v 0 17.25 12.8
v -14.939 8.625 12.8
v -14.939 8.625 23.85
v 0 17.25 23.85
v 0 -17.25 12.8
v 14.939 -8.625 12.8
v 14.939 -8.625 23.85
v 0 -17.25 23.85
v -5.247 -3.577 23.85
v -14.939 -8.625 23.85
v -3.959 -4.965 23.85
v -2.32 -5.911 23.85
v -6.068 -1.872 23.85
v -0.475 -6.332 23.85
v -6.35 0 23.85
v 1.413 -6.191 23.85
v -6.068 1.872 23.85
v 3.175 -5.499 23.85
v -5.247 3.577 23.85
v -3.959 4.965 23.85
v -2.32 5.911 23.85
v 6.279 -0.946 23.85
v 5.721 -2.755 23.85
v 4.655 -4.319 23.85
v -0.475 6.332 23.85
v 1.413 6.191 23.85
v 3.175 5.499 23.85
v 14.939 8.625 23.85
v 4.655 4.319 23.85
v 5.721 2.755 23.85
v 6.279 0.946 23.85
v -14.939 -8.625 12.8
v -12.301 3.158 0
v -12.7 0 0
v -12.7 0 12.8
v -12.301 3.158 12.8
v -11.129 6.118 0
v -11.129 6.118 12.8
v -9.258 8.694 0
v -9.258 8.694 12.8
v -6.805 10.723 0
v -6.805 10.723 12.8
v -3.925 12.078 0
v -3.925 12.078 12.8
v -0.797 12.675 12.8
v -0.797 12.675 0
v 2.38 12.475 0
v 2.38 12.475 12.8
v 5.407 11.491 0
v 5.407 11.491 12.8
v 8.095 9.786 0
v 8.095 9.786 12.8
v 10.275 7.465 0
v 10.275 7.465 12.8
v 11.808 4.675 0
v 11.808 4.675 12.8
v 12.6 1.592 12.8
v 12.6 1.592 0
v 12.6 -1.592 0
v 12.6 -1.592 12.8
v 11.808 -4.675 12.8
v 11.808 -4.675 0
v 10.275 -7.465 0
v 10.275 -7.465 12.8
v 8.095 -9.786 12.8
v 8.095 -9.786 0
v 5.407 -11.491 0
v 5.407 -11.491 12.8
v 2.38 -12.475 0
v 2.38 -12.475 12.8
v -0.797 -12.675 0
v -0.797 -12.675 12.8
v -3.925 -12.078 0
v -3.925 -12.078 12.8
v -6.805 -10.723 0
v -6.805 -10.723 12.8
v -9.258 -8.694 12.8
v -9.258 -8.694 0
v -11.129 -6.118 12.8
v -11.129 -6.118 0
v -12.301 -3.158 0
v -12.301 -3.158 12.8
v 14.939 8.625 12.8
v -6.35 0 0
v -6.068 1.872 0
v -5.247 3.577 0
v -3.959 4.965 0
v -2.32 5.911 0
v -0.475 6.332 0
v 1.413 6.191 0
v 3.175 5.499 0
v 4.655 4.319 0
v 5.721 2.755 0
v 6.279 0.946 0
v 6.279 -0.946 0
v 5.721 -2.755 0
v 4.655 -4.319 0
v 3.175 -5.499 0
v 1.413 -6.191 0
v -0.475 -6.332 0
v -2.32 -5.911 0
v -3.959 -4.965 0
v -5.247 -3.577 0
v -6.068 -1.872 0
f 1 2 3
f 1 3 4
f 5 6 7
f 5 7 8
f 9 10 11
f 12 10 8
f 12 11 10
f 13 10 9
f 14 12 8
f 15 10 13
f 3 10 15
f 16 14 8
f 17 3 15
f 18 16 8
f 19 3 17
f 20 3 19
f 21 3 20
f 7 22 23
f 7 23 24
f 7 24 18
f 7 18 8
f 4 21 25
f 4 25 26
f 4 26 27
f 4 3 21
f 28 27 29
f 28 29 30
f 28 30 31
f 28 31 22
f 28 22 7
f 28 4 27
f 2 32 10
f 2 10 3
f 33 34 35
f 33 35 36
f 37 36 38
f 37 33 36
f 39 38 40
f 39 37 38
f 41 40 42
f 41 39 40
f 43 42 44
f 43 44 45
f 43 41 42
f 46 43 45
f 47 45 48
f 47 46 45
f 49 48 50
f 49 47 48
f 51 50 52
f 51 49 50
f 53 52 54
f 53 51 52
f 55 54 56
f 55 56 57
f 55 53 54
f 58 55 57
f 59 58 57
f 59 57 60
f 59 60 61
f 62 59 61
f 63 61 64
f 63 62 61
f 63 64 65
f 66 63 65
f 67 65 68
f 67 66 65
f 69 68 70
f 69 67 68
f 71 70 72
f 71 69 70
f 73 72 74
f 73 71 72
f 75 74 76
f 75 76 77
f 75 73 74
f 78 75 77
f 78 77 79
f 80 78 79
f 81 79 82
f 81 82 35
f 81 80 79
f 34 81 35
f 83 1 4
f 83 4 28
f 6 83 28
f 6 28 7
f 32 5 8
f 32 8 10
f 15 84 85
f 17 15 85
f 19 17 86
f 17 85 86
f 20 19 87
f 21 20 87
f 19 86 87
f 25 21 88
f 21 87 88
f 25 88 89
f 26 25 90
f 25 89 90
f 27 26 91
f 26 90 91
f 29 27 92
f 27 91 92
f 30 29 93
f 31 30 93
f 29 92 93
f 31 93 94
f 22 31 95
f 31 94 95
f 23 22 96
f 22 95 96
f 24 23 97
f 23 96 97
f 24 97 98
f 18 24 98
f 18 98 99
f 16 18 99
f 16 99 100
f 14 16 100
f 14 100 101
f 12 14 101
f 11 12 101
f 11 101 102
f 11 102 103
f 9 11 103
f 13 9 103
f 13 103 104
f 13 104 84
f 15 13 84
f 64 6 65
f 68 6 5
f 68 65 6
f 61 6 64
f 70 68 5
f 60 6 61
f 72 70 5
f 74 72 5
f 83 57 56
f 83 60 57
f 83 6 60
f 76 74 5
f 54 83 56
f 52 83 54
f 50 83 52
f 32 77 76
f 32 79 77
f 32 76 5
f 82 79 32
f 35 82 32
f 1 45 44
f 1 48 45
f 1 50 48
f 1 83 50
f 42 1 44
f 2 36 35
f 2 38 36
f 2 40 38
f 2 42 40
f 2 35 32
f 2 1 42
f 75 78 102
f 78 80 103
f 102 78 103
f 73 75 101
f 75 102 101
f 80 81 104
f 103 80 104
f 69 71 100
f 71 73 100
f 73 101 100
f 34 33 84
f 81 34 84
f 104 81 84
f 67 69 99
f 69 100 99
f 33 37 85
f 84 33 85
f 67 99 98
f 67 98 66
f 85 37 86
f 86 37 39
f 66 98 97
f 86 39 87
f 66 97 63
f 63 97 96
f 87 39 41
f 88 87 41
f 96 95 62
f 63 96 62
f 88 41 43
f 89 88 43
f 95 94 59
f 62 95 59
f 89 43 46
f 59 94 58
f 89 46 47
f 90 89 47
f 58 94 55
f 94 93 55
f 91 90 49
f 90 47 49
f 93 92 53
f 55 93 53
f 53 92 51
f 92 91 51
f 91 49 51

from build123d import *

# Parameters (mm, degrees)
SCHIZZO1_R                   = 17.25
ESTRUSIONE_ESTRUSIONE1_DEPTH = 23.85
TAGLIO_ESTRUSIONE1_START     = -11.05
TAGLIO_ESTRUSIONE1_DEPTH     = 11.05
FORO_25_5_12_7_1_D           = 12.7
SCHIZZO5_R                   = 17.25
SCHIZZO5_R_2                 = 12.7
TAGLIO_ESTRUSIONE2_DEPTH     = 12.8


with BuildPart() as part:
    # Schizzo1 → Estrusione-Estrusione1 (new body)
    with BuildSketch(Plane.XY):
        Circle(SCHIZZO1_R)
    extrude(amount=ESTRUSIONE_ESTRUSIONE1_DEPTH)

    # Schizzo2 → Taglio-Estrusione1 (cut)
    with BuildSketch(Plane.XY.offset(23.85).offset(TAGLIO_ESTRUSIONE1_START)):
        with BuildLine():
            Line((-14.938938215, 8.625), (0, 17.25))
            ThreePointArc((0, 17.25), (-8.625, 14.938938215), (-14.938938215, 8.625))
        make_face()
        with BuildLine():
            Line((-14.938938215, -8.625), (-14.938938215, 8.625))
            ThreePointArc((-14.938938215, 8.625), (-17.25, 0), (-14.938938215, -8.625))
        make_face()
        with BuildLine():
            Line((0, -17.25), (-14.938938215, -8.625))
            ThreePointArc((-14.938938215, -8.625), (-8.625, -14.938938215), (0, -17.25))
        make_face()
        with BuildLine():
            ThreePointArc((0, -17.25), (8.625, -14.938938215), (14.938938215, -8.625))
            Line((14.938938215, -8.625), (0, -17.25))
        make_face()
        with BuildLine():
            ThreePointArc((17.25, 0), (16.662220503, 4.464628528), (14.938938215, 8.625))
            Line((14.938938215, 8.625), (14.938938215, -8.625))
            ThreePointArc((14.938938215, -8.625), (16.662220503, -4.464628528), (17.25, 0))
        make_face()
        with BuildLine():
            ThreePointArc((14.938938215, 8.625), (8.625, 14.938938215), (0, 17.25))
            Line((0, 17.25), (14.938938215, 8.625))
        make_face()
    extrude(amount=TAGLIO_ESTRUSIONE1_DEPTH, mode=Mode.SUBTRACT)

    # Foro Ø25.5 (12.7)-1 (through all)
    with Locations(Plane.XY.offset(23.85)):
        with Locations((0, 0)):
            Hole(FORO_25_5_12_7_1_D / 2)

    # Schizzo5 → Taglio-Estrusione2 (cut)
    with BuildSketch(Plane(origin=(0, 0, 0), x_dir=(-1, 0, 0), z_dir=(0, 0, -1))):
        Circle(SCHIZZO5_R)
        Circle(SCHIZZO5_R_2, mode=Mode.SUBTRACT)
    extrude(amount=-TAGLIO_ESTRUSIONE2_DEPTH, mode=Mode.SUBTRACT)


solid = part.part
